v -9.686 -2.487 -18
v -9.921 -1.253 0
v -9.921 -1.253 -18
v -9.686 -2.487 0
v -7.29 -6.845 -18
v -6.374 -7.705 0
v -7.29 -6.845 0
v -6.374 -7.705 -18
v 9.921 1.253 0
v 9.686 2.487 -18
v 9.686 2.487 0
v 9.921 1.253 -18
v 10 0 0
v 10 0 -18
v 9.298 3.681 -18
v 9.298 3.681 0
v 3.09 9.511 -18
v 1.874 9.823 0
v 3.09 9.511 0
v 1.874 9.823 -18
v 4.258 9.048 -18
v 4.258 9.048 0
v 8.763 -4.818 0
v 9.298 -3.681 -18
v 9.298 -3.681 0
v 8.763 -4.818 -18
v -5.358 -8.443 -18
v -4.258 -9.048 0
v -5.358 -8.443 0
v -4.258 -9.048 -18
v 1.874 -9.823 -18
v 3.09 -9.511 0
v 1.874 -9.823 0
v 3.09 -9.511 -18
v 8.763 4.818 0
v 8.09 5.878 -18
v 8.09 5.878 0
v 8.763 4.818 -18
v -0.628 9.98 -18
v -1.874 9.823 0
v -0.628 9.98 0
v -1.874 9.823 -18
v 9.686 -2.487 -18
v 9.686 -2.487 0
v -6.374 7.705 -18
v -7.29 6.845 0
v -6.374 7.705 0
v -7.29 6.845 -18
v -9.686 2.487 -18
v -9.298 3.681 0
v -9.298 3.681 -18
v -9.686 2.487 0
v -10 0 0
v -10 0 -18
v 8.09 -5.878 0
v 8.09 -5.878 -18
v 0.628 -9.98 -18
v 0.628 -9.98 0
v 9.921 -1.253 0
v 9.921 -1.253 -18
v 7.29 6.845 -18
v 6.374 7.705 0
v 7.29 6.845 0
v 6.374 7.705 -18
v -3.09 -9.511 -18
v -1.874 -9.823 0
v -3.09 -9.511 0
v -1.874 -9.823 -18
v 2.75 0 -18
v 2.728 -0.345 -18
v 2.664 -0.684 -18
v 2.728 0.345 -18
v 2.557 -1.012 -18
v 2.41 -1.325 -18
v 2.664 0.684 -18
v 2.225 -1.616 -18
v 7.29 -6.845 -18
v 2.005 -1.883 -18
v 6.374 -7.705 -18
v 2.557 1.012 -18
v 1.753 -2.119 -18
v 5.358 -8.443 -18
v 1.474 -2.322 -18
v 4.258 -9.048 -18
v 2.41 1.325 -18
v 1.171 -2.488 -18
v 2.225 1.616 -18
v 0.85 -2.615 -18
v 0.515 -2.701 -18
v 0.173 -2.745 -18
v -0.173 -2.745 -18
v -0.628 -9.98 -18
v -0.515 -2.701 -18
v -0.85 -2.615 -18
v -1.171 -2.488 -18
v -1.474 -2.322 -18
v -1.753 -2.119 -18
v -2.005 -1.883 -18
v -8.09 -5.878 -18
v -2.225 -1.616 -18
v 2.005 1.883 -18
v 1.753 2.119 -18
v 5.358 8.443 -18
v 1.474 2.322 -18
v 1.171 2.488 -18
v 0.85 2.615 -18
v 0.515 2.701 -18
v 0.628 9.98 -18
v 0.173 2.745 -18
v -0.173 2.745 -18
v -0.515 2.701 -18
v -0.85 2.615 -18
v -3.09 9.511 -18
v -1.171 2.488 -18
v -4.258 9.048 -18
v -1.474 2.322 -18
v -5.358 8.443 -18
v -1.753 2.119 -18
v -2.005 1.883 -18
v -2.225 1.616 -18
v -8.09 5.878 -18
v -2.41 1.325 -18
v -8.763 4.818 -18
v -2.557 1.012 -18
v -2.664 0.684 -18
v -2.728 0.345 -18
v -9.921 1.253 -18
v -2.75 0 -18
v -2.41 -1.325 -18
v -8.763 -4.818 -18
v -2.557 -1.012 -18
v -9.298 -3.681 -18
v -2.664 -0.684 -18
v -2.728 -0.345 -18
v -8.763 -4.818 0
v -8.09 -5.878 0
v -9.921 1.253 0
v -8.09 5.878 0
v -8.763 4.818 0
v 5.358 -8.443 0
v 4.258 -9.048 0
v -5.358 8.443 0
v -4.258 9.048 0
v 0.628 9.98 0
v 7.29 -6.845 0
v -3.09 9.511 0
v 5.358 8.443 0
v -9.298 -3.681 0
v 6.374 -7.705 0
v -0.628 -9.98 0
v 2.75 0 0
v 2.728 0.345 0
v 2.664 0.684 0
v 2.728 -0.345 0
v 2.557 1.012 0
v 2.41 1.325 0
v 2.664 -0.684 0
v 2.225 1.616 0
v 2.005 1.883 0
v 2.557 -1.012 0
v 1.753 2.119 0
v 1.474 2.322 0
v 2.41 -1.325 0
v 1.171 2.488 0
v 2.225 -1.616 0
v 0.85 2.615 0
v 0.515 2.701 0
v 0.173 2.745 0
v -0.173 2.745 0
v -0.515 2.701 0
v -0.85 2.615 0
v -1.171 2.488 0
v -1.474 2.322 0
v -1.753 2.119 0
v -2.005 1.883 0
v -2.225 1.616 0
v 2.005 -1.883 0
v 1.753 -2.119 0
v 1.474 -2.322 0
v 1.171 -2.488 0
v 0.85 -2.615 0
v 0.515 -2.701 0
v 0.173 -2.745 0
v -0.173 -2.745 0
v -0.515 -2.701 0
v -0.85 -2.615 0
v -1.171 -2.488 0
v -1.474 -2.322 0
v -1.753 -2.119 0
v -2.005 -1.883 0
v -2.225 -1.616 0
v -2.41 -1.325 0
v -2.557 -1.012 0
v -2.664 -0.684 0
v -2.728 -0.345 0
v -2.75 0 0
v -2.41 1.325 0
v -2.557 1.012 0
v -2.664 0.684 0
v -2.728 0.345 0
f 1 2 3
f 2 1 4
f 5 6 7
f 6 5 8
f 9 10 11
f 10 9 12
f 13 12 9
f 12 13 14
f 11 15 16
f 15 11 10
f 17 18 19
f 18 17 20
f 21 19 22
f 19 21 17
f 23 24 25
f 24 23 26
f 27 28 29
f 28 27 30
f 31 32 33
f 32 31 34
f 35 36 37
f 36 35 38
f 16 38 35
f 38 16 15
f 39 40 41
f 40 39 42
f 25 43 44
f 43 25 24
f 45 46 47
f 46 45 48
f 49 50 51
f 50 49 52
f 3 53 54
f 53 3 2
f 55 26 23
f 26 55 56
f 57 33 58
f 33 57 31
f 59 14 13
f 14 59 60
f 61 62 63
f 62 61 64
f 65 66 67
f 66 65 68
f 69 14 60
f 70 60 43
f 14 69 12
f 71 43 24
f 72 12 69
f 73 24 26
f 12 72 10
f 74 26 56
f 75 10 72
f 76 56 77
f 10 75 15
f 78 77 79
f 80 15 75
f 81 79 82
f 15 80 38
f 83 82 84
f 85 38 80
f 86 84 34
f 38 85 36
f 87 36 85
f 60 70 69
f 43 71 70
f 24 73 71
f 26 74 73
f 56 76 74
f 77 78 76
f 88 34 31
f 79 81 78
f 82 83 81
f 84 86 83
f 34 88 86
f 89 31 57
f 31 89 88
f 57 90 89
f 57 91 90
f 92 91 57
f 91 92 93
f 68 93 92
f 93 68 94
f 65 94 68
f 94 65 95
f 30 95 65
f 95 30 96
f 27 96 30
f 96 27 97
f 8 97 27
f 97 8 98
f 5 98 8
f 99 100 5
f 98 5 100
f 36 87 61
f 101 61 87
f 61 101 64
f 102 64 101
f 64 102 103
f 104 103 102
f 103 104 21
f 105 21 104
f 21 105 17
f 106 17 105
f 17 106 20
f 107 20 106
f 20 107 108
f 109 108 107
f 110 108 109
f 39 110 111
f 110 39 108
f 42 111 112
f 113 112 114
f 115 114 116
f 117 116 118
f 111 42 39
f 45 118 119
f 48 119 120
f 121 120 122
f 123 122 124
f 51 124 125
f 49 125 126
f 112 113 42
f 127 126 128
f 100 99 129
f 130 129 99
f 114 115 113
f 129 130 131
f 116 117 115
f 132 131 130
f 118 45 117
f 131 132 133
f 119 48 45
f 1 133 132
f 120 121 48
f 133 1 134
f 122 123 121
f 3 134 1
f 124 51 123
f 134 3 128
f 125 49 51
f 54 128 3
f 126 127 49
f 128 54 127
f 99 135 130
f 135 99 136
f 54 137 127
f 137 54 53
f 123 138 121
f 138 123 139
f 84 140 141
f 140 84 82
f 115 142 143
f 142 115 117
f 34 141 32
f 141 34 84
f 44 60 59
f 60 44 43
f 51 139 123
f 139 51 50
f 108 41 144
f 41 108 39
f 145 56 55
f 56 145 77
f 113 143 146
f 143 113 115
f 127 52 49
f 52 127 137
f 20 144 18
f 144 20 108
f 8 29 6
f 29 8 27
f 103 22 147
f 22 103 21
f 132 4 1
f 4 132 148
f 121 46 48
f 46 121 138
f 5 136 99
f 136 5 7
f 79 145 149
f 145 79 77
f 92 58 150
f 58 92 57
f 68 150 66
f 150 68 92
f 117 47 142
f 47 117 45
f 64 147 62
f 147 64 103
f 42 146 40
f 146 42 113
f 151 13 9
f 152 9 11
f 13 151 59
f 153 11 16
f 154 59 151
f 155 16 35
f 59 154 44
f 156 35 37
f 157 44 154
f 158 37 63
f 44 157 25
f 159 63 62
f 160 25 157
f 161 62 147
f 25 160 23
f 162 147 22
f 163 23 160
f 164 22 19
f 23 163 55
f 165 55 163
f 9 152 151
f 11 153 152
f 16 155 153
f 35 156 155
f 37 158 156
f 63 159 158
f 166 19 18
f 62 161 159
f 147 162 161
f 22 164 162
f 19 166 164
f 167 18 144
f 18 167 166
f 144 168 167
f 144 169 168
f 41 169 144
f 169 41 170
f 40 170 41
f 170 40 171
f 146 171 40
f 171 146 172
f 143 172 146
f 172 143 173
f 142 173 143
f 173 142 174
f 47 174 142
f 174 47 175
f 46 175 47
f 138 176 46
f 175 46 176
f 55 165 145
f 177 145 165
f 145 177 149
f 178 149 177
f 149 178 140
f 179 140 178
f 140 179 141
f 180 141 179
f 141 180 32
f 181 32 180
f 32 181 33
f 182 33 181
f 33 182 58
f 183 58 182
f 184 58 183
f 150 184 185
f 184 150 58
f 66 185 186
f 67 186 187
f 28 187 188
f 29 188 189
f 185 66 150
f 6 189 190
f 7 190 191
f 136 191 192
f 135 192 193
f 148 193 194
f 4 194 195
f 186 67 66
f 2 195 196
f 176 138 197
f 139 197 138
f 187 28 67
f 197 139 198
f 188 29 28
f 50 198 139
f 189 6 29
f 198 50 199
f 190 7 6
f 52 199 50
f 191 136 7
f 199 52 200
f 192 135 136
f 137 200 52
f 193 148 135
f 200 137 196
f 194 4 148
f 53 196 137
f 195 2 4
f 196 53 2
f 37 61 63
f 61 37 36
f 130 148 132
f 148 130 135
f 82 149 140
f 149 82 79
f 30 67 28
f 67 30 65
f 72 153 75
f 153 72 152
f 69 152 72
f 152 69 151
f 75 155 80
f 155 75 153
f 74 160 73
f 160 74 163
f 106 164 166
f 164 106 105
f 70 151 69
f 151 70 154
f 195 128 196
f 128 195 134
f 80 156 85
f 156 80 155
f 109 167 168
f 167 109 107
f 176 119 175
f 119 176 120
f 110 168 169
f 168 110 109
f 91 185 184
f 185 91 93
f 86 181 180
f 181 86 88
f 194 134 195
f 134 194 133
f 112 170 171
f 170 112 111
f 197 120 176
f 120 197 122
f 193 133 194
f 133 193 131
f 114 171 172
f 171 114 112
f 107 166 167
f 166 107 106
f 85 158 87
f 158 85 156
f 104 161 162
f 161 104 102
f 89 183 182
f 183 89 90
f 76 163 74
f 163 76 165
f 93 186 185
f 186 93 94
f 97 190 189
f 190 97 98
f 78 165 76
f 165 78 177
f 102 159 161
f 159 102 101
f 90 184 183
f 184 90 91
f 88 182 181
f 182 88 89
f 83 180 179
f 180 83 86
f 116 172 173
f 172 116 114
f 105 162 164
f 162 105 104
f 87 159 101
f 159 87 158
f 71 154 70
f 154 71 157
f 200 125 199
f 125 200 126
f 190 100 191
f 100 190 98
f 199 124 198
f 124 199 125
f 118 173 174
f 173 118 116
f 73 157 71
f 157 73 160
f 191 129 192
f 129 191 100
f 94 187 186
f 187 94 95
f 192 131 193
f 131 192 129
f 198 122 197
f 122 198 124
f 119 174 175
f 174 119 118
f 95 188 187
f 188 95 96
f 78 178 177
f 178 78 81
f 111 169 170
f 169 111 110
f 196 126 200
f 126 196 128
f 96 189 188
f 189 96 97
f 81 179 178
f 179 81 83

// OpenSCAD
$fn = 50;


difference() {
	union() {
		translate(v = [0, 0, -18.0000000000]) {
			cylinder(h = 18, r = 10.0000000000);
		}
		cylinder(h = 0, r = 13.0000000000);
	}
	union() {
		#translate(v = [0, 0, -18]) {
			cylinder(h = 18, r = 2.7500000000);
		}
	}
}
